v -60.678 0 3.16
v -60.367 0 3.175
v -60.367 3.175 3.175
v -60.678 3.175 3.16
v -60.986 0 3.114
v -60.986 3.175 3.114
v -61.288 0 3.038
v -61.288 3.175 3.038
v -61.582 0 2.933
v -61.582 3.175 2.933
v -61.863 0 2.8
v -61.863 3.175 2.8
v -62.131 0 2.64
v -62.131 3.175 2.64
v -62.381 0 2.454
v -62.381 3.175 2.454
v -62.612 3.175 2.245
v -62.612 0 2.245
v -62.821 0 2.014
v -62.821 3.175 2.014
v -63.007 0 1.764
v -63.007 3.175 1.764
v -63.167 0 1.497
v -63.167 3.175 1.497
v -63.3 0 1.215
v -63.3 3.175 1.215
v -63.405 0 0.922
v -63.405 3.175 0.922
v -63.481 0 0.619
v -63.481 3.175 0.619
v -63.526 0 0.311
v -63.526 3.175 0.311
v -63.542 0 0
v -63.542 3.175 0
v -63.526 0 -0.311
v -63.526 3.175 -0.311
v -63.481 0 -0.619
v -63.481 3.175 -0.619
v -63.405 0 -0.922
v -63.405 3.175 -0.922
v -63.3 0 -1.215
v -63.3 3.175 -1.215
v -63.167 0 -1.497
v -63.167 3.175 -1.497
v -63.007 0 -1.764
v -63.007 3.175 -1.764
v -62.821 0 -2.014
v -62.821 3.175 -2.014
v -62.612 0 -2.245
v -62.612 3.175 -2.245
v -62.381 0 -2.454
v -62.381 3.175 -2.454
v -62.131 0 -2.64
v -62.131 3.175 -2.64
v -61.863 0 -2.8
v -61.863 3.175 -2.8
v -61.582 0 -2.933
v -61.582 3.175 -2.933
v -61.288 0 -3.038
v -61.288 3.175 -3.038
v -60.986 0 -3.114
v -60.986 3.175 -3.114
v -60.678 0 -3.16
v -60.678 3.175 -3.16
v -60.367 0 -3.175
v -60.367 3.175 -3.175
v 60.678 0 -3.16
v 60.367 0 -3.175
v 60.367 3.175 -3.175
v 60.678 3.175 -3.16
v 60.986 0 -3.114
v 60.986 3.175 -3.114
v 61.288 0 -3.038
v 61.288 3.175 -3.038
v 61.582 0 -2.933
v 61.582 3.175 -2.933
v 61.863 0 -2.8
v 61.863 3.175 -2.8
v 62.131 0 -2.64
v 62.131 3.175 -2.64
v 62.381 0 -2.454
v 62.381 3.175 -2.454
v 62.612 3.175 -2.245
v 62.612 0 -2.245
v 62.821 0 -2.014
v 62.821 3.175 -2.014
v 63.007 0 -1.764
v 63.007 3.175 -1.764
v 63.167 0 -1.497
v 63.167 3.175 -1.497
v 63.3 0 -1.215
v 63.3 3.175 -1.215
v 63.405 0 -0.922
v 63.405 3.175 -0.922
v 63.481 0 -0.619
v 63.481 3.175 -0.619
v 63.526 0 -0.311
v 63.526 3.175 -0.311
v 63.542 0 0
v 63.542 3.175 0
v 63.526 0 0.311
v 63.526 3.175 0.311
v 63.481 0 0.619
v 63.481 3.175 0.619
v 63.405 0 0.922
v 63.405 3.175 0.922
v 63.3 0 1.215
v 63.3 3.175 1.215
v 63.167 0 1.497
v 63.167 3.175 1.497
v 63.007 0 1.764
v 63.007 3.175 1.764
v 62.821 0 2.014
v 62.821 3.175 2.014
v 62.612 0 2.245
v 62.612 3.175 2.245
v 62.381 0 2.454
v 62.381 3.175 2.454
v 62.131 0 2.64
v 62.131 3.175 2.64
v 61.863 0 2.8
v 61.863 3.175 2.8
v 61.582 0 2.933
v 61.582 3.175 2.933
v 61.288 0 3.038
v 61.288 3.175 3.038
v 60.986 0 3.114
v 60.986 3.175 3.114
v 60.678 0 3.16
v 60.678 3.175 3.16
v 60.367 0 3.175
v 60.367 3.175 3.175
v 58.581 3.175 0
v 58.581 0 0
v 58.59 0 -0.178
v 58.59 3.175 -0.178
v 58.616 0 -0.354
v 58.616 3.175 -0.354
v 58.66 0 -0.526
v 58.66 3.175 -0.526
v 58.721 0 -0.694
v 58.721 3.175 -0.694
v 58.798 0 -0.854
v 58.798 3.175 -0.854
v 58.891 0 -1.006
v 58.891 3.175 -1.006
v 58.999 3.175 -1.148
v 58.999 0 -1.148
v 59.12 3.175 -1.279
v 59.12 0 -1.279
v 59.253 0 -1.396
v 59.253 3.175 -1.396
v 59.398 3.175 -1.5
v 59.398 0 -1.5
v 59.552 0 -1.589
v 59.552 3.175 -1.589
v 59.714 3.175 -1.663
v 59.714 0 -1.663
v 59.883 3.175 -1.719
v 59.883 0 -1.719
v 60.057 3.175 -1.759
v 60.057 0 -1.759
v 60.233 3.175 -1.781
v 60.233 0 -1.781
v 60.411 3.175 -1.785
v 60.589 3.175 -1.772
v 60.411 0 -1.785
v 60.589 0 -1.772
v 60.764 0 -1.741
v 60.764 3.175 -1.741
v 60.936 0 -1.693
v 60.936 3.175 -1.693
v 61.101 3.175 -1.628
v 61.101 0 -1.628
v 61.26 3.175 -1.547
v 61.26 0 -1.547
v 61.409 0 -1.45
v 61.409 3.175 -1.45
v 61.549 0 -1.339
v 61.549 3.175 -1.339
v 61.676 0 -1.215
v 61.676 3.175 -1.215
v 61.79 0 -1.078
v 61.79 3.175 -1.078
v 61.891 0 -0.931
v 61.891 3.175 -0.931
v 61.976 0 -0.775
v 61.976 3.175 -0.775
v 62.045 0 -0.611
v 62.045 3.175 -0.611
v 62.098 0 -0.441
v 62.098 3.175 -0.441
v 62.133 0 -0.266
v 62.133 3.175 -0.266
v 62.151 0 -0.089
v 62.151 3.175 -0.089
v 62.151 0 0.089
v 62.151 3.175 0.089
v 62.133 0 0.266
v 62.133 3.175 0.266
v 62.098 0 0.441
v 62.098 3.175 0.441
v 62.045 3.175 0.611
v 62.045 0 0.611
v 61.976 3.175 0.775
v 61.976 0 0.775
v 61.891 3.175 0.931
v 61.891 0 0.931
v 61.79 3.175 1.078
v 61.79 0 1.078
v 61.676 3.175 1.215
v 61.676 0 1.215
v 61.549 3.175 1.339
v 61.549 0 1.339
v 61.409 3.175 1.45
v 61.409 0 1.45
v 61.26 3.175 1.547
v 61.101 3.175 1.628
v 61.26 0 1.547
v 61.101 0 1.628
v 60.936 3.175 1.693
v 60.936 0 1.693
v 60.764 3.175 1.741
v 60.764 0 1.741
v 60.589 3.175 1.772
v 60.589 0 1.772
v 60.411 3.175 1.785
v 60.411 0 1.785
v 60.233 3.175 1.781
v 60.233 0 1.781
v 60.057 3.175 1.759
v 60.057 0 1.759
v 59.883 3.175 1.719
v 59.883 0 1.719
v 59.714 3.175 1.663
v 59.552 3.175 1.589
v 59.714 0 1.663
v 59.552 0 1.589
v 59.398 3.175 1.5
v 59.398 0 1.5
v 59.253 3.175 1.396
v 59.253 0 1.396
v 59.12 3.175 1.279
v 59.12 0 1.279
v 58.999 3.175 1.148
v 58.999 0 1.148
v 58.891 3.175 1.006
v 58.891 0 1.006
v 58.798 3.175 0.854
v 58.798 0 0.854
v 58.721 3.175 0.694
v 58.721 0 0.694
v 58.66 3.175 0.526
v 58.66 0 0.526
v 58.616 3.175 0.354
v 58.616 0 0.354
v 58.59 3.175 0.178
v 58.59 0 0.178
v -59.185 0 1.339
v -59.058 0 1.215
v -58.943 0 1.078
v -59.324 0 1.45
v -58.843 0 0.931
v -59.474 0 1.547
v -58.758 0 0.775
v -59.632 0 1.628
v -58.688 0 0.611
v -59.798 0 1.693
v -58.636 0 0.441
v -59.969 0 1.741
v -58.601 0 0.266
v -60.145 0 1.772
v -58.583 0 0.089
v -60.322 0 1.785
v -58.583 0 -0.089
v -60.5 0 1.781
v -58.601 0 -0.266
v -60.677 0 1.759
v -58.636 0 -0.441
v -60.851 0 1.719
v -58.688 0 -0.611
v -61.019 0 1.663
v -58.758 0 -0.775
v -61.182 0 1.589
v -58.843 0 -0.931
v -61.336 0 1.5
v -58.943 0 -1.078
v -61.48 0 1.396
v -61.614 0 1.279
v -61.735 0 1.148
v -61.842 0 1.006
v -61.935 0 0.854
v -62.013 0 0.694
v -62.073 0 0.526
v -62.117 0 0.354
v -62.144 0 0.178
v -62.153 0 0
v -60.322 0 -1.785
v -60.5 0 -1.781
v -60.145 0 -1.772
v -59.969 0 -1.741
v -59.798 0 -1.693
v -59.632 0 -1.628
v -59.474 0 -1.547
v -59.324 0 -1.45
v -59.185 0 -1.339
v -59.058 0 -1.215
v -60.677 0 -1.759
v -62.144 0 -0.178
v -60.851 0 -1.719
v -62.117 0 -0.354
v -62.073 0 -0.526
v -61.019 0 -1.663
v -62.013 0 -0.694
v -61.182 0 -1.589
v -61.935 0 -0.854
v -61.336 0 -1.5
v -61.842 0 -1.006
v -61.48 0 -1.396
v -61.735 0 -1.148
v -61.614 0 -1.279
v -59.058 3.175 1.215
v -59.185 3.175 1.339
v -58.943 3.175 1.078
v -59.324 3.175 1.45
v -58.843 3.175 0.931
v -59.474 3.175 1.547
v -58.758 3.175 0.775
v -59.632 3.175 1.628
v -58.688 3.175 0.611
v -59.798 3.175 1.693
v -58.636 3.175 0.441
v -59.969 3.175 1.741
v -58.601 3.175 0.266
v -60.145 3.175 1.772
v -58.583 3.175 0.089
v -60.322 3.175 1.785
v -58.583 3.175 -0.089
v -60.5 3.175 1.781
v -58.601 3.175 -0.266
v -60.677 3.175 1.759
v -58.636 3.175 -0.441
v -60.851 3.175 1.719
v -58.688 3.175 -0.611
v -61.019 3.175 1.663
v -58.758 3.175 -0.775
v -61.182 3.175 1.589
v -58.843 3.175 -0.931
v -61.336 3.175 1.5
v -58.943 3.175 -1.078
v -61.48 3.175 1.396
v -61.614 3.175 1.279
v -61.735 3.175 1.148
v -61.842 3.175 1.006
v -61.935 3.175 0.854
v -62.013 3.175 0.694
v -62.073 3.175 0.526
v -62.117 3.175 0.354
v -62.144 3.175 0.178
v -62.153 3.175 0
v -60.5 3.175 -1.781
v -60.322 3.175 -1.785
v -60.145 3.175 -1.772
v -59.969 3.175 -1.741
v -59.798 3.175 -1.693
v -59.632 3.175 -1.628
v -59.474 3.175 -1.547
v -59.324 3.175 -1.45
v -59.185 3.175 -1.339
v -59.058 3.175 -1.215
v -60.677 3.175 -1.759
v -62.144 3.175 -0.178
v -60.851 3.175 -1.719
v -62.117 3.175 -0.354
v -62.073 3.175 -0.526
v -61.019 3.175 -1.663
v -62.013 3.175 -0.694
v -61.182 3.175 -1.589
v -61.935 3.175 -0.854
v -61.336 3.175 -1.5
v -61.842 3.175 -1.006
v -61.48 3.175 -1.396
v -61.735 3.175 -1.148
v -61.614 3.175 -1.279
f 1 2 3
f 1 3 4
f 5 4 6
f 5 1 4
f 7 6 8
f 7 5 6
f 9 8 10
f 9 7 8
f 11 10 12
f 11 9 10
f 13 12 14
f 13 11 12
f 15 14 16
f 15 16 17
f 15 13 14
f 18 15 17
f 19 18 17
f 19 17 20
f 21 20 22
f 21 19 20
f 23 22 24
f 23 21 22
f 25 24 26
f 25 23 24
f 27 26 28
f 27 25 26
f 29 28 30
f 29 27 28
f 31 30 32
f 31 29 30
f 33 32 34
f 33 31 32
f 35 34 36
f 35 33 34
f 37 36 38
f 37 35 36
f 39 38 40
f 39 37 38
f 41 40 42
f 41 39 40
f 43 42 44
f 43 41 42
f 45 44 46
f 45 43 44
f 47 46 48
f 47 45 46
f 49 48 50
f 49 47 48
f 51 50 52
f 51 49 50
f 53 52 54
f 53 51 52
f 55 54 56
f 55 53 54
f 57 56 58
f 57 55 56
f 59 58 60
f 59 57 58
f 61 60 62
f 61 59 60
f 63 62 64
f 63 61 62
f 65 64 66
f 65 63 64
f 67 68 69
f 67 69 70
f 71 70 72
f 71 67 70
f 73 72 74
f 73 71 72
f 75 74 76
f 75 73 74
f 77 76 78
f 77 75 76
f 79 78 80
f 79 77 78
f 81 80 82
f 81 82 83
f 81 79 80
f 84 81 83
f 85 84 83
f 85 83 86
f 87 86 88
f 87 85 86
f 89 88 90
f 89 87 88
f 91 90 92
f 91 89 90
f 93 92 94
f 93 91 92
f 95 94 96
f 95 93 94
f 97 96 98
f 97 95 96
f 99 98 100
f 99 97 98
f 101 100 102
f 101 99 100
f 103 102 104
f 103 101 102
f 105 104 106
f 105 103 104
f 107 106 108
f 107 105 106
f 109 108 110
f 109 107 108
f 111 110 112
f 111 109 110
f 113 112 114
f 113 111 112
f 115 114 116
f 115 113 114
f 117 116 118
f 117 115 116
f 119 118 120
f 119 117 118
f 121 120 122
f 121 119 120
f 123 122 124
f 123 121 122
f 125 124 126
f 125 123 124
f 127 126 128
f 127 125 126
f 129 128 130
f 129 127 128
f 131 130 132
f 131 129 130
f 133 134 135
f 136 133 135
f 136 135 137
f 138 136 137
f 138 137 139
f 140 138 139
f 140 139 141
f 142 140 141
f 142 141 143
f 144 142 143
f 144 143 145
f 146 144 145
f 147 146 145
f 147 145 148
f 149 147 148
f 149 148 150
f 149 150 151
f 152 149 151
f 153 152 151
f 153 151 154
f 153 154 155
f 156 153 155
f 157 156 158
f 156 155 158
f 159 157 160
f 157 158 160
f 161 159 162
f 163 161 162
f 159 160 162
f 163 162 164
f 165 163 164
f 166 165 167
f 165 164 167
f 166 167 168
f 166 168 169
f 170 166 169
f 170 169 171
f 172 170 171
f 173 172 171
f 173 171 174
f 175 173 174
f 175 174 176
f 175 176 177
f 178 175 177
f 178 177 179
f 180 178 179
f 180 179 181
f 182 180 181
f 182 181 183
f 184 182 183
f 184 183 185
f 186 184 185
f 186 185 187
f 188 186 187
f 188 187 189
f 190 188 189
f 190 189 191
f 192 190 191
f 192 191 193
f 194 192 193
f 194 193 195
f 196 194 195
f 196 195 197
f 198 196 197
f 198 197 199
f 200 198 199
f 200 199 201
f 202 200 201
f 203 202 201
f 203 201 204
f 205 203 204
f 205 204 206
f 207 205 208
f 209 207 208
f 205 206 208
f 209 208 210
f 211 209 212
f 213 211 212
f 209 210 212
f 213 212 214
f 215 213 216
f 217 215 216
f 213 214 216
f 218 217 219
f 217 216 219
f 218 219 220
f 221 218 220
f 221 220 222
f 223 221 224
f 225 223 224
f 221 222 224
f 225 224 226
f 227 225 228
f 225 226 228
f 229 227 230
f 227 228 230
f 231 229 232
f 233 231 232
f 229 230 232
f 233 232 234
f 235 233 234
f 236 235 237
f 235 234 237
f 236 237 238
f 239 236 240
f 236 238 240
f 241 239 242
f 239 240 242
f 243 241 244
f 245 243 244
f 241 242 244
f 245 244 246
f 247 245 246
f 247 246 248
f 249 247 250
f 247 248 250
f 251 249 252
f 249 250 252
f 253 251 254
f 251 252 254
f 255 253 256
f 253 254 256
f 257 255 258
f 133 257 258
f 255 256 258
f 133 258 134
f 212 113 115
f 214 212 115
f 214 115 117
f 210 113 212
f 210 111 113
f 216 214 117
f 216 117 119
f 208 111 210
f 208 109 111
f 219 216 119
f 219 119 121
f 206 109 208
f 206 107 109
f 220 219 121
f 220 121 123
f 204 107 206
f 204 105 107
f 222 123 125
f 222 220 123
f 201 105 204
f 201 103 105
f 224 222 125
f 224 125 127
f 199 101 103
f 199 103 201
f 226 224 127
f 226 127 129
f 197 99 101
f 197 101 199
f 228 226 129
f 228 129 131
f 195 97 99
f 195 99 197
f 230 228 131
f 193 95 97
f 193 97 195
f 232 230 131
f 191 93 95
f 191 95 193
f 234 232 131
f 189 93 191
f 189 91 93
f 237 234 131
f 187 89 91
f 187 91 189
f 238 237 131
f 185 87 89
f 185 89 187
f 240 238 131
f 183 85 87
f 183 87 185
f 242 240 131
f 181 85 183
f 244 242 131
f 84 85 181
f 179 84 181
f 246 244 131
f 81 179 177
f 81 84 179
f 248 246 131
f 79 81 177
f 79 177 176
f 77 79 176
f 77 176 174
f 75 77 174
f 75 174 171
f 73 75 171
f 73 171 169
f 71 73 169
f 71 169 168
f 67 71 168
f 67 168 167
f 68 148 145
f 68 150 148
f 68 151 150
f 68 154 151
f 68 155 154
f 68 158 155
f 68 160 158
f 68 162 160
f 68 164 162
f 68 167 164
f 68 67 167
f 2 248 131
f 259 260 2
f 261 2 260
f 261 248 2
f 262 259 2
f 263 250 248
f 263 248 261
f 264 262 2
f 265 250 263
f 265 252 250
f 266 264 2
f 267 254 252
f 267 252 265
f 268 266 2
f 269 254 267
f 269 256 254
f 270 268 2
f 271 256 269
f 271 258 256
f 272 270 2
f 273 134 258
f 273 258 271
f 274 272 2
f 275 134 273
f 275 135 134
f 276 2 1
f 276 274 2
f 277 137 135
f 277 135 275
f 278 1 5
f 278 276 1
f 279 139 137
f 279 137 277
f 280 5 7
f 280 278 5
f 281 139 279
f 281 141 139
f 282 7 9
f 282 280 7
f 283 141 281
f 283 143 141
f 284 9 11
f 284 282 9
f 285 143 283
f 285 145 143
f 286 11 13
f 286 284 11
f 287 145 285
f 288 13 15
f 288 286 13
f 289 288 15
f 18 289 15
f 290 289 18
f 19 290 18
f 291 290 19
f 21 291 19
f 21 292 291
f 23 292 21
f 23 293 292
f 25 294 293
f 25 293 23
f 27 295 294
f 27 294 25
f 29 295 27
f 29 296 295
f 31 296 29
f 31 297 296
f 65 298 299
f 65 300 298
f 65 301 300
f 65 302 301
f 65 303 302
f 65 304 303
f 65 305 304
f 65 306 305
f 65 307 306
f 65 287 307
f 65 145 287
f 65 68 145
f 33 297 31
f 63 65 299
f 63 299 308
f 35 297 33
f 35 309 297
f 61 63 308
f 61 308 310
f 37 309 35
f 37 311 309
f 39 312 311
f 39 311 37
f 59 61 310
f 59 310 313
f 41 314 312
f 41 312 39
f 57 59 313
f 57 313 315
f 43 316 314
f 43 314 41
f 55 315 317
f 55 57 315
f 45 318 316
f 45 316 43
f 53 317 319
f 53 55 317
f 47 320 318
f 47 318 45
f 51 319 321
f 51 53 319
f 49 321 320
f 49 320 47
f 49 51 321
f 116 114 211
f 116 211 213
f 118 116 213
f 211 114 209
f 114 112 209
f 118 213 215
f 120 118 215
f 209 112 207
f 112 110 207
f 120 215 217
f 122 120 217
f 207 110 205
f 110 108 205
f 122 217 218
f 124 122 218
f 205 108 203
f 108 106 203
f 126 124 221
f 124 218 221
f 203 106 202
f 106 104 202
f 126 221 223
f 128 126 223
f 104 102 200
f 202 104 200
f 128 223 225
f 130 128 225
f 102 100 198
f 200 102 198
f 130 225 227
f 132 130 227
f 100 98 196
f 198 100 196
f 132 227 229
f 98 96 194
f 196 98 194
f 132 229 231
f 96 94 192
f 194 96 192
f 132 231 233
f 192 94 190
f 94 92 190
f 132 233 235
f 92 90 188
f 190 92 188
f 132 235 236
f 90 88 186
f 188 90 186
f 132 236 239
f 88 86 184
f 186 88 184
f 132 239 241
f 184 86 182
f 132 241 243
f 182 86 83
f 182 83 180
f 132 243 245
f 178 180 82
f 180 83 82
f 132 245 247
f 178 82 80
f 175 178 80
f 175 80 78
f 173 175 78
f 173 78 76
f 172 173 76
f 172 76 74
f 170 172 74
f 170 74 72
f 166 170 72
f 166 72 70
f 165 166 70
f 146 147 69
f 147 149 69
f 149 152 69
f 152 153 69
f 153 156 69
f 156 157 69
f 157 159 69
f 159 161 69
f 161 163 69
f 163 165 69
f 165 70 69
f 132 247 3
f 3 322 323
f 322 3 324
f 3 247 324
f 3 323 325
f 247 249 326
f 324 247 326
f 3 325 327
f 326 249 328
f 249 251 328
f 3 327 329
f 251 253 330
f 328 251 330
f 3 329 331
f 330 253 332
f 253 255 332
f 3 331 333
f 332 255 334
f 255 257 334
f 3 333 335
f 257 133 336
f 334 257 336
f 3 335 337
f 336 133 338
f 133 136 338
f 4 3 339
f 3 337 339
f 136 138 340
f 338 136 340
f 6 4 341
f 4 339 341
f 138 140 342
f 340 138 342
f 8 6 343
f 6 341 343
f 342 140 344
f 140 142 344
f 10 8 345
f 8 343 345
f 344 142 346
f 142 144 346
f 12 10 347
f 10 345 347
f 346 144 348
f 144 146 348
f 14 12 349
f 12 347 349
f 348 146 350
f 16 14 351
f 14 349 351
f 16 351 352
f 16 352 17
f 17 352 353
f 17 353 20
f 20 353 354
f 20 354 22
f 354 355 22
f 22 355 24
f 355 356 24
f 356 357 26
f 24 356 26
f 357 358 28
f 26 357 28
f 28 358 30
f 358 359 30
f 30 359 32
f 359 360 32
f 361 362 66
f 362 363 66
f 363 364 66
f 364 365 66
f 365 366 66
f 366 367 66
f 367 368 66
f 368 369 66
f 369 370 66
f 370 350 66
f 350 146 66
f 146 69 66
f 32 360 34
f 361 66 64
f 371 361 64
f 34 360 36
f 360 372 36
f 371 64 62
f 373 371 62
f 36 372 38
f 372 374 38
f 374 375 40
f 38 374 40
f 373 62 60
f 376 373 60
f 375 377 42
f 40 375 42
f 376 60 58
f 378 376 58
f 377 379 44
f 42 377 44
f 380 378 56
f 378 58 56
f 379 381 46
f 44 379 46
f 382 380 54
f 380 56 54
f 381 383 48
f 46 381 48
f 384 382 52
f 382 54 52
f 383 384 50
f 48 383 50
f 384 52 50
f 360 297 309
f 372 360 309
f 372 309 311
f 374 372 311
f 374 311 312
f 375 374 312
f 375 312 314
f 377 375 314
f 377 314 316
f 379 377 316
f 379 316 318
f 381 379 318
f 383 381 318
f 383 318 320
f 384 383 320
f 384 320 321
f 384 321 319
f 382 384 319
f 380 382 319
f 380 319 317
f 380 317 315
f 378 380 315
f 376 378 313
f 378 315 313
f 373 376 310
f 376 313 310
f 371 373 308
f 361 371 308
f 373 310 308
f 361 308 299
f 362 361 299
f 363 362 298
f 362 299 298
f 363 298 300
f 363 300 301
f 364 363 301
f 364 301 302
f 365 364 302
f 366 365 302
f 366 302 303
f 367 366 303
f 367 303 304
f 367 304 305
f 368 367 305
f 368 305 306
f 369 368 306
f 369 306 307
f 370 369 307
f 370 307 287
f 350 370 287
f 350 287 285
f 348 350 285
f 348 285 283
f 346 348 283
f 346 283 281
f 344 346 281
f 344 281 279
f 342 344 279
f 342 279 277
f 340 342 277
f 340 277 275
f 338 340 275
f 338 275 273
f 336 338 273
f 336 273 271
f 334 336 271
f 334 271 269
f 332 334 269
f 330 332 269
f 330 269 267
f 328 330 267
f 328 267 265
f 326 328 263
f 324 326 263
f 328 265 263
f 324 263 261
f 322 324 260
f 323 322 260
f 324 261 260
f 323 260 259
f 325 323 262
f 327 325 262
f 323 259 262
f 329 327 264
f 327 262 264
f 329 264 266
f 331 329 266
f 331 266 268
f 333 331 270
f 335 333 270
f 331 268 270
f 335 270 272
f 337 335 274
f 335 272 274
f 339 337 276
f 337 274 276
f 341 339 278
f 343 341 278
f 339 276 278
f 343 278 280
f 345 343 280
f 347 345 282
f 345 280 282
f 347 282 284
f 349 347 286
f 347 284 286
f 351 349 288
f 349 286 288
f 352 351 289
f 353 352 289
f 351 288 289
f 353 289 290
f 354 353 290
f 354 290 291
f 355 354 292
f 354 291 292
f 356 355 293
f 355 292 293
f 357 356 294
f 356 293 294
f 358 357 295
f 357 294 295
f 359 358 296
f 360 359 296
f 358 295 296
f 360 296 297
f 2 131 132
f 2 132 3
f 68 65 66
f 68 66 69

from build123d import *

# Parameters (mm, degrees)
BOSS_EXTRUDE1_DEPTH             = 3.175
F_9_64_0_14063_DIAMETER_HOLE1_D = 3.572002


with BuildPart() as part:
    # Sketch1 → Boss-Extrude1 (new body)
    with BuildSketch(Plane(origin=(0, 0, 0), x_dir=(1, 0, 0), z_dir=(0, 1, 0))):
        with BuildLine():
            Line((60.366783, -3.175), (-60.366783, -3.175))
            ThreePointArc((-60.366783, -3.175), (-63.541783, 0), (-60.366783, 3.175))
            Line((-60.366783, 3.175), (60.366783, 3.175))
            ThreePointArc((60.366783, 3.175), (63.541783, 0), (60.366783, -3.175))
        make_face()
    extrude(amount=BOSS_EXTRUDE1_DEPTH)

    # 9/64 (0.14063) Diameter Hole1 (through all)
    with Locations(Plane(origin=(0, 3.175, 0), x_dir=(1, 0, 0), z_dir=(0, 1, 0))):
        with Locations((60.366783, 0), (-60.366783, 0)):
            Hole(F_9_64_0_14063_DIAMETER_HOLE1_D / 2)


solid = part.part
